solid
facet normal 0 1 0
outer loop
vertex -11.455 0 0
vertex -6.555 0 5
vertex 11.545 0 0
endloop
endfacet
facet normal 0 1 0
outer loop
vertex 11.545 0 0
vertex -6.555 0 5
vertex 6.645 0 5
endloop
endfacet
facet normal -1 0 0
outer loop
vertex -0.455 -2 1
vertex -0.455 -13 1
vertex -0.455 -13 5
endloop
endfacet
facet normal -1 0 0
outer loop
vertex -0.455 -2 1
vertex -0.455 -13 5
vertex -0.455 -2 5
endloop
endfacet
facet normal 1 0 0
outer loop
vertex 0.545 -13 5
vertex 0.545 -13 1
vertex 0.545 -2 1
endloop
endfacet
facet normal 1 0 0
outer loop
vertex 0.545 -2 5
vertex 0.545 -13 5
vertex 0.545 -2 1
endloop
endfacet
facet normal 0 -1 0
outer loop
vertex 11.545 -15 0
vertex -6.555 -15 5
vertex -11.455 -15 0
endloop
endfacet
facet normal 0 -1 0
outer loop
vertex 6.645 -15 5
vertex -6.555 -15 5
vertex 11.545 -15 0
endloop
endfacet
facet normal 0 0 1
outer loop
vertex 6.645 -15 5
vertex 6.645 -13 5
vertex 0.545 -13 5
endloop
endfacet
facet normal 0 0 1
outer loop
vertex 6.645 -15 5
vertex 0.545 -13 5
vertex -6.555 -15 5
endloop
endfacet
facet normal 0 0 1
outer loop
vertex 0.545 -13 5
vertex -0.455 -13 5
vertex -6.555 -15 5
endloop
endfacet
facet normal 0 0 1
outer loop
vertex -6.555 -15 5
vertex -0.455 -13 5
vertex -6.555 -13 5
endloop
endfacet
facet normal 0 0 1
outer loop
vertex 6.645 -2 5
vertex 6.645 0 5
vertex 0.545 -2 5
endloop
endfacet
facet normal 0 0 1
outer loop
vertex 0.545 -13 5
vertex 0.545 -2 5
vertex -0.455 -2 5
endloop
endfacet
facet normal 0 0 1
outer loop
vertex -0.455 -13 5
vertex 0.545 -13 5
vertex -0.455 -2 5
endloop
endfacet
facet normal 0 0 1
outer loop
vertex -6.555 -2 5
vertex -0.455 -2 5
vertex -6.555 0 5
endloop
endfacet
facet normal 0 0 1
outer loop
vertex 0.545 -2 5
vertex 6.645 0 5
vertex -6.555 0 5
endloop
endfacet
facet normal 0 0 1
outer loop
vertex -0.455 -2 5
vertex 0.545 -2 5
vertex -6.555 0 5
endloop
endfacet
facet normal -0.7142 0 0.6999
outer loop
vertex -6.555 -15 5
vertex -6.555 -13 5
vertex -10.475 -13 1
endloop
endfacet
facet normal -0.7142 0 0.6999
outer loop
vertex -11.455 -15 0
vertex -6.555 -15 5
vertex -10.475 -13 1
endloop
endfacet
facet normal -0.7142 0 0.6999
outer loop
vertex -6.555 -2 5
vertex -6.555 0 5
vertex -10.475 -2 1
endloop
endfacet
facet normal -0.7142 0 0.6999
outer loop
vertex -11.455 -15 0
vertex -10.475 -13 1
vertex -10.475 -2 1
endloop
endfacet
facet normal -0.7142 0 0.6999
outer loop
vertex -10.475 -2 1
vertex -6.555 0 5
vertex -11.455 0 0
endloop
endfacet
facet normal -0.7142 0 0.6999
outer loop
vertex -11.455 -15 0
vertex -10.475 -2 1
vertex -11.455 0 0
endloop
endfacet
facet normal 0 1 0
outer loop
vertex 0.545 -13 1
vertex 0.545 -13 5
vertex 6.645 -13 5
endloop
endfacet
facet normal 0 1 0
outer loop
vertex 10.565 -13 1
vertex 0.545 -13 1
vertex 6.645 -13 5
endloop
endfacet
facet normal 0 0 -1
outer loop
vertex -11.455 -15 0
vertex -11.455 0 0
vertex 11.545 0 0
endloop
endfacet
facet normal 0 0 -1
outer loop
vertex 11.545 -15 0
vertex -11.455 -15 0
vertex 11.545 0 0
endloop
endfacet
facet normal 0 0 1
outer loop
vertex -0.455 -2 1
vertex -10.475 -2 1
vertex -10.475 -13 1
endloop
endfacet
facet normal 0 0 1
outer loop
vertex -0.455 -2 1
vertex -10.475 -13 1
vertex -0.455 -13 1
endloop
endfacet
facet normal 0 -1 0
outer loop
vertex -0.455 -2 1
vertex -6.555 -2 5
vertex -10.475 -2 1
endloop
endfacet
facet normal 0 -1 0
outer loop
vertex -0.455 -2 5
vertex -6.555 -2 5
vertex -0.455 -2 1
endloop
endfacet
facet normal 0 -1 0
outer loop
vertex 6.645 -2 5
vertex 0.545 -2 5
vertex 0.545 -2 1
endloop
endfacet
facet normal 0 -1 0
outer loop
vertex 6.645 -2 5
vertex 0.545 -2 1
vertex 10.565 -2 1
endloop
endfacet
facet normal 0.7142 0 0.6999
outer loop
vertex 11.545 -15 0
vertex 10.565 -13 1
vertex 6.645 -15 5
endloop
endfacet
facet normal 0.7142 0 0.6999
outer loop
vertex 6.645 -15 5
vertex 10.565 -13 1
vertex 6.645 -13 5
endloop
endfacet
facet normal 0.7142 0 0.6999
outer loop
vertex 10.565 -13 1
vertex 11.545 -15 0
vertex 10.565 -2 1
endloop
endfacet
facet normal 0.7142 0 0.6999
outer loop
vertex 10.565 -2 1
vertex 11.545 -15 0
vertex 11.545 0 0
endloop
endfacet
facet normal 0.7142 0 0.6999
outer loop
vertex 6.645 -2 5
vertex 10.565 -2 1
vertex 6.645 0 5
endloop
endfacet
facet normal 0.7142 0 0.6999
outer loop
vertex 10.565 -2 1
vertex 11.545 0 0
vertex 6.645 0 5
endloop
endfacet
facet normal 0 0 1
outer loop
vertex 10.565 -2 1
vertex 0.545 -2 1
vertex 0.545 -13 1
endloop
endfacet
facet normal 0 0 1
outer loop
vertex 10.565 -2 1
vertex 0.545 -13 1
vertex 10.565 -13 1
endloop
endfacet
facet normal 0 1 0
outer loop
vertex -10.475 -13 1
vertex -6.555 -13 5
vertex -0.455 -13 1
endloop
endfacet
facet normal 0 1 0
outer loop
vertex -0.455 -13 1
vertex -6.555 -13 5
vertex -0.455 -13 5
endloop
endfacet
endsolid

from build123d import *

# Parameters (mm, degrees)
F1_DEPTH = 15
F2_W     = 23
F2_H     = 11
F3_DEPTH = 4
F4_W     = 1
F4_H     = 11
F5_DEPTH = 4


with BuildPart() as f1:
    # F0 (on Front) → F1 (new body)
    with BuildSketch(Plane.XZ):
        Polygon((-6.555008, 5), (-11.455226, 0), (11.544774, 0), (6.644992, 5), align=None)
    extrude(amount=F1_DEPTH)

    # F2 (on face) → F3 (cut)
    with BuildSketch(Plane.XY.offset(5)):
        with Locations((0.044774, -7.5)):
            Rectangle(F2_W, F2_H)
    extrude(amount=-F3_DEPTH, mode=Mode.SUBTRACT)

    # F4 (on face) → F5 (join)
    with BuildSketch(Plane.XY.offset(1)):
        with Locations((0.044818, -7.5)):
            Rectangle(F4_W, F4_H)
    extrude(amount=F5_DEPTH)


solid = f1.part
